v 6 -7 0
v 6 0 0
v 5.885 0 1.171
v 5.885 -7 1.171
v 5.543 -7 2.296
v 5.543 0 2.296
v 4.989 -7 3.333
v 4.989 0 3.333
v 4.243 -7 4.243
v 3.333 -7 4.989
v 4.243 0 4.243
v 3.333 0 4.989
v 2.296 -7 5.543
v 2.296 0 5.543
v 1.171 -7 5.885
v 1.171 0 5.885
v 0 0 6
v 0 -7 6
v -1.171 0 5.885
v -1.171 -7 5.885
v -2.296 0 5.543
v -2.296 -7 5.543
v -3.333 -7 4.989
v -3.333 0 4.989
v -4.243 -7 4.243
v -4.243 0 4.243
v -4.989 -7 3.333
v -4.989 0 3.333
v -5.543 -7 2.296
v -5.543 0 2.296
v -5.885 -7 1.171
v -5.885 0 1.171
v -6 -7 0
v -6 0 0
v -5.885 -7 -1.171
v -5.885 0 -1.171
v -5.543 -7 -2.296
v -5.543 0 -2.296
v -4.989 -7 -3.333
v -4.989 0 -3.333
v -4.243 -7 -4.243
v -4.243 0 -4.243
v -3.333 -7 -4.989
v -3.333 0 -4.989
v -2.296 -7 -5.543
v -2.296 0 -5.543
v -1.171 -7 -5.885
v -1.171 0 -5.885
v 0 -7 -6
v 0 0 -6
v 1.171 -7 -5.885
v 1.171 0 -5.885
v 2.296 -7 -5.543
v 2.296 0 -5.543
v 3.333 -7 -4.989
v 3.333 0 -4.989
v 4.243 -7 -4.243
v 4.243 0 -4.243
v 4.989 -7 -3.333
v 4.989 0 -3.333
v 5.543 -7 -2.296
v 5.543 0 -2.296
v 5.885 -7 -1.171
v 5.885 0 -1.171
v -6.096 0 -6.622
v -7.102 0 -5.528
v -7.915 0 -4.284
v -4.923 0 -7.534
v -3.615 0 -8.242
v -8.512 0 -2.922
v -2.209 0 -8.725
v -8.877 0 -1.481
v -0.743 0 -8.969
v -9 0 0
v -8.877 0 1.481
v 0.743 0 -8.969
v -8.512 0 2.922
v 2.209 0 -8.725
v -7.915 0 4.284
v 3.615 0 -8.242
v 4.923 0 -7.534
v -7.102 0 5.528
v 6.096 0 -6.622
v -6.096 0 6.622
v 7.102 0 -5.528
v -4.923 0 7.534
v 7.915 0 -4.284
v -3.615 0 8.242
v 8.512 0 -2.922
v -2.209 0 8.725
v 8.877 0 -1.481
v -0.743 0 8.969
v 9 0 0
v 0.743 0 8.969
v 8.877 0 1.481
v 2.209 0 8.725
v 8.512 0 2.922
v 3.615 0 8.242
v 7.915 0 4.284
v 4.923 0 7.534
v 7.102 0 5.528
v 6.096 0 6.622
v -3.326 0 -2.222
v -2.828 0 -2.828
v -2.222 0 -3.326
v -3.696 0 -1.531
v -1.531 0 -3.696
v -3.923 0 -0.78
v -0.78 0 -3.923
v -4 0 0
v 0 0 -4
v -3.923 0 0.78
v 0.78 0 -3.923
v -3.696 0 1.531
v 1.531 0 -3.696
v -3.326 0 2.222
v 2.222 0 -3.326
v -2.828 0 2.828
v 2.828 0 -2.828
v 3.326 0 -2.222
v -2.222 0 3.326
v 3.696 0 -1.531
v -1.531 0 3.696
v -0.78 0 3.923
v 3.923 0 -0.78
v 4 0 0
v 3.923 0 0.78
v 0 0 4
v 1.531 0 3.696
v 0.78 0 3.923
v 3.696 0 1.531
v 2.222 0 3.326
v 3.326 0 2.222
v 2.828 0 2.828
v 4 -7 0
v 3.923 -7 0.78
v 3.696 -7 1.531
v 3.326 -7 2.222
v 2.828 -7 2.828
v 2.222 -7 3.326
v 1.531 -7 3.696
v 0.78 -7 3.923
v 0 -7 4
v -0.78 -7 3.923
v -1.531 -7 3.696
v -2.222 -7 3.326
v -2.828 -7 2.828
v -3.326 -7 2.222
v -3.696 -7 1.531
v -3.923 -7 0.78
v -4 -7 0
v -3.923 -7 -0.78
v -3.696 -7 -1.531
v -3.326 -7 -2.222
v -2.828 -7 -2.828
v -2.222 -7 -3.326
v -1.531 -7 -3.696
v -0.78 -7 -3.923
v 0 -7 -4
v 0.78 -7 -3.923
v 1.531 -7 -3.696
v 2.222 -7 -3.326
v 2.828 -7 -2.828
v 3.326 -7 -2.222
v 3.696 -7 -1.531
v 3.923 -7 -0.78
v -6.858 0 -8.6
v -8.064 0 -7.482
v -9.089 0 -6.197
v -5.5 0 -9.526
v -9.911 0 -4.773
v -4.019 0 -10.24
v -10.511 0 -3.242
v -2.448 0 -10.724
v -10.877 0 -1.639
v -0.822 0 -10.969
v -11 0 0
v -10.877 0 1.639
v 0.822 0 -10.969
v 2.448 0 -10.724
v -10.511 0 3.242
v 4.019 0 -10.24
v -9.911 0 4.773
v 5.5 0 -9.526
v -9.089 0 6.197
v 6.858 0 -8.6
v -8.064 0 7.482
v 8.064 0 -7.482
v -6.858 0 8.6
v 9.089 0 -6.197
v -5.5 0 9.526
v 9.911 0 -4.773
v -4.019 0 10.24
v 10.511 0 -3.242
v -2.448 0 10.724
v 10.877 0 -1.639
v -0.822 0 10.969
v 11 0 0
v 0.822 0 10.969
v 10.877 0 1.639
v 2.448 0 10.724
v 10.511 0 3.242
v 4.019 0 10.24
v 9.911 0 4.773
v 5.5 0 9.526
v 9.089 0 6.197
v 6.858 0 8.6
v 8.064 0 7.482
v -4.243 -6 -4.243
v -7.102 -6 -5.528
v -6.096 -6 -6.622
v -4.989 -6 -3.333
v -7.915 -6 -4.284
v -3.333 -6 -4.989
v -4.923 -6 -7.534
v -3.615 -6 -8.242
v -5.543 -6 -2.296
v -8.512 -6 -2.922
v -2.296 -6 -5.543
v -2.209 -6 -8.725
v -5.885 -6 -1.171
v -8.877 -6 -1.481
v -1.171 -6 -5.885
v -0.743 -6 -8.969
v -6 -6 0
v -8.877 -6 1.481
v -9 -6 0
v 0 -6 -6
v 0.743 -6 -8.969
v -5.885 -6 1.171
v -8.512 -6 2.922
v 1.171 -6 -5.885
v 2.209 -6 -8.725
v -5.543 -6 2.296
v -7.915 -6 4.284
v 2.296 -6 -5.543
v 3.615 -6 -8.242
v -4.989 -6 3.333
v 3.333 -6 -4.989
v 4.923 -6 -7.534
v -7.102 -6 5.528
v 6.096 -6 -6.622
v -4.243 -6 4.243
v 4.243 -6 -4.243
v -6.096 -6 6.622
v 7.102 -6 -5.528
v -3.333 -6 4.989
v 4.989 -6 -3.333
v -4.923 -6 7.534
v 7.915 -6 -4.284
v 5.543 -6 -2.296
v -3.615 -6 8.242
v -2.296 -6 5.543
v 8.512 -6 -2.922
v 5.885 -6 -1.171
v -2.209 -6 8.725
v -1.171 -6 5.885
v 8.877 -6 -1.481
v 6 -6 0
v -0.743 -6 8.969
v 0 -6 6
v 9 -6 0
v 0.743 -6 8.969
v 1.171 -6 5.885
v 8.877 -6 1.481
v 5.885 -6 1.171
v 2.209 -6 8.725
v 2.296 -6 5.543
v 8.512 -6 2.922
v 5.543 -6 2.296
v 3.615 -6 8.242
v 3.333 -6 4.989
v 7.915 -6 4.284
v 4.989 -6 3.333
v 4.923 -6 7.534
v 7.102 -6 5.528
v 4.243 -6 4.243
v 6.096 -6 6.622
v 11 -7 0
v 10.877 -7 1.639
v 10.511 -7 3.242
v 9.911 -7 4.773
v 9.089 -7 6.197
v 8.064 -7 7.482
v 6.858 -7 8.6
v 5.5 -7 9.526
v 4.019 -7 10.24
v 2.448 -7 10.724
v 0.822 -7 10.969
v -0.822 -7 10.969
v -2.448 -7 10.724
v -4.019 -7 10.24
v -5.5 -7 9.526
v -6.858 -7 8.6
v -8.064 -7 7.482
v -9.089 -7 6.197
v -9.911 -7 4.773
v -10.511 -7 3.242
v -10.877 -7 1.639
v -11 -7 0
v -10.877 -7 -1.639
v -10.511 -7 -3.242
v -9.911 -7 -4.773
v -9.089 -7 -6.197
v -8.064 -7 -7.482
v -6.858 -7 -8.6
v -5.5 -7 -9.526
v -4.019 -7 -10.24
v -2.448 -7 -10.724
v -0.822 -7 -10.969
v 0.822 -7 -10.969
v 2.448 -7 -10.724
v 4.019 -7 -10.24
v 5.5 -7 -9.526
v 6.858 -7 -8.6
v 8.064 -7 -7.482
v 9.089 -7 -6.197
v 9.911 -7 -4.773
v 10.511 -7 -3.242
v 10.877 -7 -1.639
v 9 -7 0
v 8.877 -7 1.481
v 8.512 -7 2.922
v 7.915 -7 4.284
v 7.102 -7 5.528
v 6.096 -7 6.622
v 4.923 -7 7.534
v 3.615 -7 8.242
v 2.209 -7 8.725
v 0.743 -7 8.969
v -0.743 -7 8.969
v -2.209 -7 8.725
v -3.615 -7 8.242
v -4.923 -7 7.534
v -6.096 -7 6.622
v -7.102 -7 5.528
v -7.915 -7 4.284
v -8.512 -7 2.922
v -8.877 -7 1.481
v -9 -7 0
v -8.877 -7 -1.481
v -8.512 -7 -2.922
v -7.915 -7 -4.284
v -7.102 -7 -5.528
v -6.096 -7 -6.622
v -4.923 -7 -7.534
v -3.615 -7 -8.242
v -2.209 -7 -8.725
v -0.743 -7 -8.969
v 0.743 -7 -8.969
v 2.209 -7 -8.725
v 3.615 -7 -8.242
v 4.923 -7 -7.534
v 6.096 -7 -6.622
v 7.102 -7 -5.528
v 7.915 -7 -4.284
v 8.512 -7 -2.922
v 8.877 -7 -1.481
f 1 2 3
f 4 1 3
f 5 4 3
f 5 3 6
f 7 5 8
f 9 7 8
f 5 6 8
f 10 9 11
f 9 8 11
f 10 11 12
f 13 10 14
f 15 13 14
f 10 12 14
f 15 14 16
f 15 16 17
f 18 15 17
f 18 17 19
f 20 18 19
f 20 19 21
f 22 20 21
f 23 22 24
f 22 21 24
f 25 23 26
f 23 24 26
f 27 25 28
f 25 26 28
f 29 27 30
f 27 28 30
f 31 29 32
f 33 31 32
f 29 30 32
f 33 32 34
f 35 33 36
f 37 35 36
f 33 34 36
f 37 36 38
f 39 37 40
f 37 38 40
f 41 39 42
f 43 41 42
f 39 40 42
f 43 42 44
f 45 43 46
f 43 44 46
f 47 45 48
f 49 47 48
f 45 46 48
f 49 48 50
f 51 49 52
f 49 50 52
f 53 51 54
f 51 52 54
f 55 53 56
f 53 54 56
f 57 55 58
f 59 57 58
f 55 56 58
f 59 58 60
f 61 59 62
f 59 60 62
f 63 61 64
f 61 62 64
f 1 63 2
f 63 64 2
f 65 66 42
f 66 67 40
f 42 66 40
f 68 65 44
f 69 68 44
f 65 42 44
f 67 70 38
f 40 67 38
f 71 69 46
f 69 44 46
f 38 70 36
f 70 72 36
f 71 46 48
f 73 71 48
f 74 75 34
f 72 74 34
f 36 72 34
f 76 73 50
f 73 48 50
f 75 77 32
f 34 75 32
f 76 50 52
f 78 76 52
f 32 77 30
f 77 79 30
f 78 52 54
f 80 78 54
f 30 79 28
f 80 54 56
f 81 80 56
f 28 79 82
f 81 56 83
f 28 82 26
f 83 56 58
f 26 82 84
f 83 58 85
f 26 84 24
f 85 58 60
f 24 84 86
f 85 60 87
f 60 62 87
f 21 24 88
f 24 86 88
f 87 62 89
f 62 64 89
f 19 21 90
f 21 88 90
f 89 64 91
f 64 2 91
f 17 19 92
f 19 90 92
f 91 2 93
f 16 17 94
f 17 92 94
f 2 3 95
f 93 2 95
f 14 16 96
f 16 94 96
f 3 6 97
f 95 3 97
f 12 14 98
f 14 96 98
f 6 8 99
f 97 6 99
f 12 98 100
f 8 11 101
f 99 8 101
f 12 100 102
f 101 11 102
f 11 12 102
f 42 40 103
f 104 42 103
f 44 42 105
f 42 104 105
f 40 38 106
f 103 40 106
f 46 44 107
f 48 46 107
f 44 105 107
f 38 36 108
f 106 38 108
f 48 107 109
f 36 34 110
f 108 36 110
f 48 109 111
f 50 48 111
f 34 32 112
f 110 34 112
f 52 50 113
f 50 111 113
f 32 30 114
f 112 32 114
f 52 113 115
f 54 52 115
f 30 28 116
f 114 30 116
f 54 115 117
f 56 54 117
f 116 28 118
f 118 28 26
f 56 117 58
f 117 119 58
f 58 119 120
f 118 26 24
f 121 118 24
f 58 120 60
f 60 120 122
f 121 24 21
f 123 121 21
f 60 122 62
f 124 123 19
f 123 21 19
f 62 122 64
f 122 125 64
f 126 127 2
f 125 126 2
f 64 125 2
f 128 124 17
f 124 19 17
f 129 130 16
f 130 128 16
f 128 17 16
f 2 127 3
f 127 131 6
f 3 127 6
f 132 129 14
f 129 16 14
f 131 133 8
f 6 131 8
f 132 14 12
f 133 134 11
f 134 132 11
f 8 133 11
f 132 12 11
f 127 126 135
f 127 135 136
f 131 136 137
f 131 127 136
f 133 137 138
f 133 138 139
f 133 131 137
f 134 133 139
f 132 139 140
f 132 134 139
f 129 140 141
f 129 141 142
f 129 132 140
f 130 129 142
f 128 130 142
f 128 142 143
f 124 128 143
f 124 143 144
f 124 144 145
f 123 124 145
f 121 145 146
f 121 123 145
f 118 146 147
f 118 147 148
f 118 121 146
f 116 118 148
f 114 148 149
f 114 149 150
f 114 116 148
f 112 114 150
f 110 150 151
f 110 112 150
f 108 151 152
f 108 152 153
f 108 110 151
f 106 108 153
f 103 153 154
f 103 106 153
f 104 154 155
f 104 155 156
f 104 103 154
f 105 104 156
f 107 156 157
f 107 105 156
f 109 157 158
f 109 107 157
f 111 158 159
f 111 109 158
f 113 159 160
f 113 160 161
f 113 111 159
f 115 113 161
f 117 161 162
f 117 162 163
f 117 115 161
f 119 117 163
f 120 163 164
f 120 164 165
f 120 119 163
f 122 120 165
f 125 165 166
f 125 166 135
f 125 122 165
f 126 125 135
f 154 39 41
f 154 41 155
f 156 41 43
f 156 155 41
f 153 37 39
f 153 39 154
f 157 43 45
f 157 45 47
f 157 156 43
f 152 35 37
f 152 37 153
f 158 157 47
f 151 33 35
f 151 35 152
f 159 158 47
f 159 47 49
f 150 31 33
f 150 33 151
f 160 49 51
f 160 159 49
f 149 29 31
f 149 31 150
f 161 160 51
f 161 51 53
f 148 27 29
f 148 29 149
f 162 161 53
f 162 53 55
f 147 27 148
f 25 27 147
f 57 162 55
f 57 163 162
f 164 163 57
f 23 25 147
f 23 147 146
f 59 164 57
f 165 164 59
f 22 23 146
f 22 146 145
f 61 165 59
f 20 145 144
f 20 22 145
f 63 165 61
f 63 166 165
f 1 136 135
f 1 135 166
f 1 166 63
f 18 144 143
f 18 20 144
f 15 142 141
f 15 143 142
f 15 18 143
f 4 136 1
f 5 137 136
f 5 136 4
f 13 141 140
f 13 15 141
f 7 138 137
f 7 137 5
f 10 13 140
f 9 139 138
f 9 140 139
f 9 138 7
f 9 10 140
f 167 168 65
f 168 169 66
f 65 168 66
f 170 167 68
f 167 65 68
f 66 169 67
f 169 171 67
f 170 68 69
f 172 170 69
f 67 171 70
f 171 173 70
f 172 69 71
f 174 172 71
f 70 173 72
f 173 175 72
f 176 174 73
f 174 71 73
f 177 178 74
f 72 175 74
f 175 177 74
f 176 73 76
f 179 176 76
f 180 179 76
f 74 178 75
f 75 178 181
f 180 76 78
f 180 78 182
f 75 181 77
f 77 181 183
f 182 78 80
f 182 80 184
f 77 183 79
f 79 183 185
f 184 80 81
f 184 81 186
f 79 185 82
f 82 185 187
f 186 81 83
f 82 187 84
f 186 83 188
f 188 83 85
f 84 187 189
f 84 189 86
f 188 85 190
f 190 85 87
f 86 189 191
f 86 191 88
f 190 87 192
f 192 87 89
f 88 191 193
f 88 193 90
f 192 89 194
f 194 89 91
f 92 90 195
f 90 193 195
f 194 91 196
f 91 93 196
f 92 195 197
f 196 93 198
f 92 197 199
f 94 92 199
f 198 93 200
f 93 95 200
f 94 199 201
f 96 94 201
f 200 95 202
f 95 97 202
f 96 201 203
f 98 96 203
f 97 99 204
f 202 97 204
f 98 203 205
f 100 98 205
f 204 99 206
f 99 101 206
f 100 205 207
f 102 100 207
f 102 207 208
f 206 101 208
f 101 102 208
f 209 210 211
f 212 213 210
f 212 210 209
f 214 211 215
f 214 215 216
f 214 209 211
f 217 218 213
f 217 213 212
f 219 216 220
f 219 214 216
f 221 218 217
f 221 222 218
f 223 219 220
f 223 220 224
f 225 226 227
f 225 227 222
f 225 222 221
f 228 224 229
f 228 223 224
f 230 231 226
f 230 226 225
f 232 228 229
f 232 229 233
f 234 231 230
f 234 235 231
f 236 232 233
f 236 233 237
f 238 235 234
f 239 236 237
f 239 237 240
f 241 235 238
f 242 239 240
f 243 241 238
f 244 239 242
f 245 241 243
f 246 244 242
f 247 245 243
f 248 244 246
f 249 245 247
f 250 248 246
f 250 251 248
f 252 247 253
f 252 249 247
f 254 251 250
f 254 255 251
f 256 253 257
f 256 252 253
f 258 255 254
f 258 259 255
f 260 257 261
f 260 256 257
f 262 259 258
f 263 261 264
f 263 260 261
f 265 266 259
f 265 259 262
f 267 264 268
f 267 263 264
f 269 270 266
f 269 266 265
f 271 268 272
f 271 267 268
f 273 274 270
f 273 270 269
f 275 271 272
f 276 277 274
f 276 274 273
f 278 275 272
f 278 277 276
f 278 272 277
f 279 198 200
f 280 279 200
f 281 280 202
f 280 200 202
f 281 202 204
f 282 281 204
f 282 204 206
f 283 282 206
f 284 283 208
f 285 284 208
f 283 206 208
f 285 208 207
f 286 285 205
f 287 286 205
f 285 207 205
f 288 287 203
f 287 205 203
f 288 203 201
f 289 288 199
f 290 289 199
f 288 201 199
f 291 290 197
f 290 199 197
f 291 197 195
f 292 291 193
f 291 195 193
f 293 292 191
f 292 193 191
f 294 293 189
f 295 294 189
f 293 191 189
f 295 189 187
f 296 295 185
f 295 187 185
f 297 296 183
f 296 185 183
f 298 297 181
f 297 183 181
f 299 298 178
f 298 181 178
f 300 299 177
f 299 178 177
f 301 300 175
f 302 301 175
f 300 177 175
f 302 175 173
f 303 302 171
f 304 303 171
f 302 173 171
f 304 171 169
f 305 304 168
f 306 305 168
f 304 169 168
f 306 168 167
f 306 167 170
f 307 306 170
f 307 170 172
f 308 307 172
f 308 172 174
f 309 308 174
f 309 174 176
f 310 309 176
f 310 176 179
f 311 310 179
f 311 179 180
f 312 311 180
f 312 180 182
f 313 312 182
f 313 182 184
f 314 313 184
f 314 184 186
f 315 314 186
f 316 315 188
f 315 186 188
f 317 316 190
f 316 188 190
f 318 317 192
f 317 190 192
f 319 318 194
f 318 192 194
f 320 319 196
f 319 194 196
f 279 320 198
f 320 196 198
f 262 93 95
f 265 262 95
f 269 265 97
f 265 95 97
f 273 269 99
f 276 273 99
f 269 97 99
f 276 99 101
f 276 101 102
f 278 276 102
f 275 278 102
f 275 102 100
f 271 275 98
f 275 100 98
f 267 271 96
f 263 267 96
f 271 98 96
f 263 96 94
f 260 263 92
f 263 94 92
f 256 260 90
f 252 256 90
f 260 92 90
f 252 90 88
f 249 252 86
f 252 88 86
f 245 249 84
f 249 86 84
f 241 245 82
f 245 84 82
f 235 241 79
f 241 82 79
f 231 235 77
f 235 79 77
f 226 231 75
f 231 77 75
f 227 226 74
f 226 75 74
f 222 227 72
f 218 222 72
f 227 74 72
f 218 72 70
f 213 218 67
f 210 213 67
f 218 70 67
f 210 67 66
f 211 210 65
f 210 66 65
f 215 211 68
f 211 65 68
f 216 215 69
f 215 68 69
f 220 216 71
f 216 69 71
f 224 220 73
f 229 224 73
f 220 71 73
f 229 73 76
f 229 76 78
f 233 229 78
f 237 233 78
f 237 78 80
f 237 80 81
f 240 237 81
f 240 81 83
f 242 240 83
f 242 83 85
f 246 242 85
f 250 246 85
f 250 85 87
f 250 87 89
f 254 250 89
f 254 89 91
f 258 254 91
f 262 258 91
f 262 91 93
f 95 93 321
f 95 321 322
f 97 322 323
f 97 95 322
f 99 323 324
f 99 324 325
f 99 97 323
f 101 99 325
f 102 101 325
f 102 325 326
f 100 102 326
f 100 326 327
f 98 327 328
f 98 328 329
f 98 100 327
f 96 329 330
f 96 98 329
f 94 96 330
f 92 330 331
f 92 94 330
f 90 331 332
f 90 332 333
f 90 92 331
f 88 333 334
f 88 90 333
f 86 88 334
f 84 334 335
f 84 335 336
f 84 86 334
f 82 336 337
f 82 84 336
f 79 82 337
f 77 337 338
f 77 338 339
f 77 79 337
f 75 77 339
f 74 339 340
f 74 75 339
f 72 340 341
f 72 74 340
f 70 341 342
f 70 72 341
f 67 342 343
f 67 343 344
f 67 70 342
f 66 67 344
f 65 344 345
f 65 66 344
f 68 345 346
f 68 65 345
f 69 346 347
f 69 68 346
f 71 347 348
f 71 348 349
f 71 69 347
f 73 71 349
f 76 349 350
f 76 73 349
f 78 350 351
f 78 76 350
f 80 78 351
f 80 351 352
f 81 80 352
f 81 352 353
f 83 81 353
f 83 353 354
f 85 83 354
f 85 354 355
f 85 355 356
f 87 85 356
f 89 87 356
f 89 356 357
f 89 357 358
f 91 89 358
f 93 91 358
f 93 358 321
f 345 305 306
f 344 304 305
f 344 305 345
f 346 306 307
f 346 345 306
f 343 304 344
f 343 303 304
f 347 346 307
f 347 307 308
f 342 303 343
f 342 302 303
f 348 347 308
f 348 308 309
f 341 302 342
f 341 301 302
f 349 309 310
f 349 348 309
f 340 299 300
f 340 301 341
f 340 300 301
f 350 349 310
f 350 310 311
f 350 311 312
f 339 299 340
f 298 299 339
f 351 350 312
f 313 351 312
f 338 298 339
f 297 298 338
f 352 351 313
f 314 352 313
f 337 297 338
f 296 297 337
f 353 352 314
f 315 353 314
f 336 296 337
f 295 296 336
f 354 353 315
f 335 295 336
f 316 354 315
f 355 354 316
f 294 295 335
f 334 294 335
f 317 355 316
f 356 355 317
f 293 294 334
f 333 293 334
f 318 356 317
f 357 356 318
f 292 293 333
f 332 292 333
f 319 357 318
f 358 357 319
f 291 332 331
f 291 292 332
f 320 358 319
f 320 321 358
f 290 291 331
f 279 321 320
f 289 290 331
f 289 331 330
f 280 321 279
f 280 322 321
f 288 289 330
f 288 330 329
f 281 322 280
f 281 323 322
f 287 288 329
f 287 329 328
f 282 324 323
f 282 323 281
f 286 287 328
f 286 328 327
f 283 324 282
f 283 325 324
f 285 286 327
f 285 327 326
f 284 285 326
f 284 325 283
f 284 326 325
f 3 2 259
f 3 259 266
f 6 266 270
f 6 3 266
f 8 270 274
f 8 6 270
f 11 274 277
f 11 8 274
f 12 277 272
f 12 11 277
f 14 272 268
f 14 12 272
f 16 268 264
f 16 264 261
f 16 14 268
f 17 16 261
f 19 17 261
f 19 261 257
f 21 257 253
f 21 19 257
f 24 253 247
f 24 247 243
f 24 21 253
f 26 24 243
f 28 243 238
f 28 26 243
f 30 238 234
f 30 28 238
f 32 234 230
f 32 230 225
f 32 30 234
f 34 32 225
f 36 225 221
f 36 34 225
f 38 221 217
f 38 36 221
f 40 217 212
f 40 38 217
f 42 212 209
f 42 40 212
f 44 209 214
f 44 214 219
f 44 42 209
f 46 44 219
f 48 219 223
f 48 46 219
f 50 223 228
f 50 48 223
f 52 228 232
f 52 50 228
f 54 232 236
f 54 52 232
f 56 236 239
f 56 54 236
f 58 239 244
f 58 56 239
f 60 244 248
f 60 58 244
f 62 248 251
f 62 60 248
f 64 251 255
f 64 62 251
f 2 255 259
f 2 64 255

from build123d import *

# Parameters (mm, degrees)
F0_R     = 6
F0_R_2   = 4
F1_DEPTH = 7
F0_R_3   = 11
F0_R_4   = 9
F2_DEPTH = 7
F3_DEPTH = 6


with BuildPart() as f1:
    # F0 (on Front) → F1 (new body)
    with BuildSketch(Plane.XZ):
        Circle(F0_R)
        Circle(F0_R_2, mode=Mode.SUBTRACT)
    extrude(amount=F1_DEPTH)


with BuildPart() as f2:
    # F0 (on Front) → F2 (new body)
    with BuildSketch(Plane.XZ):
        Circle(F0_R_3)
        Circle(F0_R_4, mode=Mode.SUBTRACT)
    extrude(amount=F2_DEPTH)


with BuildPart() as f3:
    # F0 (on Front) → F3 (new body)
    with BuildSketch(Plane.XZ):
        Circle(F0_R_4)
        Circle(F0_R, mode=Mode.SUBTRACT)
    extrude(amount=F3_DEPTH)


solid = Compound([f1.part, f2.part, f3.part])
